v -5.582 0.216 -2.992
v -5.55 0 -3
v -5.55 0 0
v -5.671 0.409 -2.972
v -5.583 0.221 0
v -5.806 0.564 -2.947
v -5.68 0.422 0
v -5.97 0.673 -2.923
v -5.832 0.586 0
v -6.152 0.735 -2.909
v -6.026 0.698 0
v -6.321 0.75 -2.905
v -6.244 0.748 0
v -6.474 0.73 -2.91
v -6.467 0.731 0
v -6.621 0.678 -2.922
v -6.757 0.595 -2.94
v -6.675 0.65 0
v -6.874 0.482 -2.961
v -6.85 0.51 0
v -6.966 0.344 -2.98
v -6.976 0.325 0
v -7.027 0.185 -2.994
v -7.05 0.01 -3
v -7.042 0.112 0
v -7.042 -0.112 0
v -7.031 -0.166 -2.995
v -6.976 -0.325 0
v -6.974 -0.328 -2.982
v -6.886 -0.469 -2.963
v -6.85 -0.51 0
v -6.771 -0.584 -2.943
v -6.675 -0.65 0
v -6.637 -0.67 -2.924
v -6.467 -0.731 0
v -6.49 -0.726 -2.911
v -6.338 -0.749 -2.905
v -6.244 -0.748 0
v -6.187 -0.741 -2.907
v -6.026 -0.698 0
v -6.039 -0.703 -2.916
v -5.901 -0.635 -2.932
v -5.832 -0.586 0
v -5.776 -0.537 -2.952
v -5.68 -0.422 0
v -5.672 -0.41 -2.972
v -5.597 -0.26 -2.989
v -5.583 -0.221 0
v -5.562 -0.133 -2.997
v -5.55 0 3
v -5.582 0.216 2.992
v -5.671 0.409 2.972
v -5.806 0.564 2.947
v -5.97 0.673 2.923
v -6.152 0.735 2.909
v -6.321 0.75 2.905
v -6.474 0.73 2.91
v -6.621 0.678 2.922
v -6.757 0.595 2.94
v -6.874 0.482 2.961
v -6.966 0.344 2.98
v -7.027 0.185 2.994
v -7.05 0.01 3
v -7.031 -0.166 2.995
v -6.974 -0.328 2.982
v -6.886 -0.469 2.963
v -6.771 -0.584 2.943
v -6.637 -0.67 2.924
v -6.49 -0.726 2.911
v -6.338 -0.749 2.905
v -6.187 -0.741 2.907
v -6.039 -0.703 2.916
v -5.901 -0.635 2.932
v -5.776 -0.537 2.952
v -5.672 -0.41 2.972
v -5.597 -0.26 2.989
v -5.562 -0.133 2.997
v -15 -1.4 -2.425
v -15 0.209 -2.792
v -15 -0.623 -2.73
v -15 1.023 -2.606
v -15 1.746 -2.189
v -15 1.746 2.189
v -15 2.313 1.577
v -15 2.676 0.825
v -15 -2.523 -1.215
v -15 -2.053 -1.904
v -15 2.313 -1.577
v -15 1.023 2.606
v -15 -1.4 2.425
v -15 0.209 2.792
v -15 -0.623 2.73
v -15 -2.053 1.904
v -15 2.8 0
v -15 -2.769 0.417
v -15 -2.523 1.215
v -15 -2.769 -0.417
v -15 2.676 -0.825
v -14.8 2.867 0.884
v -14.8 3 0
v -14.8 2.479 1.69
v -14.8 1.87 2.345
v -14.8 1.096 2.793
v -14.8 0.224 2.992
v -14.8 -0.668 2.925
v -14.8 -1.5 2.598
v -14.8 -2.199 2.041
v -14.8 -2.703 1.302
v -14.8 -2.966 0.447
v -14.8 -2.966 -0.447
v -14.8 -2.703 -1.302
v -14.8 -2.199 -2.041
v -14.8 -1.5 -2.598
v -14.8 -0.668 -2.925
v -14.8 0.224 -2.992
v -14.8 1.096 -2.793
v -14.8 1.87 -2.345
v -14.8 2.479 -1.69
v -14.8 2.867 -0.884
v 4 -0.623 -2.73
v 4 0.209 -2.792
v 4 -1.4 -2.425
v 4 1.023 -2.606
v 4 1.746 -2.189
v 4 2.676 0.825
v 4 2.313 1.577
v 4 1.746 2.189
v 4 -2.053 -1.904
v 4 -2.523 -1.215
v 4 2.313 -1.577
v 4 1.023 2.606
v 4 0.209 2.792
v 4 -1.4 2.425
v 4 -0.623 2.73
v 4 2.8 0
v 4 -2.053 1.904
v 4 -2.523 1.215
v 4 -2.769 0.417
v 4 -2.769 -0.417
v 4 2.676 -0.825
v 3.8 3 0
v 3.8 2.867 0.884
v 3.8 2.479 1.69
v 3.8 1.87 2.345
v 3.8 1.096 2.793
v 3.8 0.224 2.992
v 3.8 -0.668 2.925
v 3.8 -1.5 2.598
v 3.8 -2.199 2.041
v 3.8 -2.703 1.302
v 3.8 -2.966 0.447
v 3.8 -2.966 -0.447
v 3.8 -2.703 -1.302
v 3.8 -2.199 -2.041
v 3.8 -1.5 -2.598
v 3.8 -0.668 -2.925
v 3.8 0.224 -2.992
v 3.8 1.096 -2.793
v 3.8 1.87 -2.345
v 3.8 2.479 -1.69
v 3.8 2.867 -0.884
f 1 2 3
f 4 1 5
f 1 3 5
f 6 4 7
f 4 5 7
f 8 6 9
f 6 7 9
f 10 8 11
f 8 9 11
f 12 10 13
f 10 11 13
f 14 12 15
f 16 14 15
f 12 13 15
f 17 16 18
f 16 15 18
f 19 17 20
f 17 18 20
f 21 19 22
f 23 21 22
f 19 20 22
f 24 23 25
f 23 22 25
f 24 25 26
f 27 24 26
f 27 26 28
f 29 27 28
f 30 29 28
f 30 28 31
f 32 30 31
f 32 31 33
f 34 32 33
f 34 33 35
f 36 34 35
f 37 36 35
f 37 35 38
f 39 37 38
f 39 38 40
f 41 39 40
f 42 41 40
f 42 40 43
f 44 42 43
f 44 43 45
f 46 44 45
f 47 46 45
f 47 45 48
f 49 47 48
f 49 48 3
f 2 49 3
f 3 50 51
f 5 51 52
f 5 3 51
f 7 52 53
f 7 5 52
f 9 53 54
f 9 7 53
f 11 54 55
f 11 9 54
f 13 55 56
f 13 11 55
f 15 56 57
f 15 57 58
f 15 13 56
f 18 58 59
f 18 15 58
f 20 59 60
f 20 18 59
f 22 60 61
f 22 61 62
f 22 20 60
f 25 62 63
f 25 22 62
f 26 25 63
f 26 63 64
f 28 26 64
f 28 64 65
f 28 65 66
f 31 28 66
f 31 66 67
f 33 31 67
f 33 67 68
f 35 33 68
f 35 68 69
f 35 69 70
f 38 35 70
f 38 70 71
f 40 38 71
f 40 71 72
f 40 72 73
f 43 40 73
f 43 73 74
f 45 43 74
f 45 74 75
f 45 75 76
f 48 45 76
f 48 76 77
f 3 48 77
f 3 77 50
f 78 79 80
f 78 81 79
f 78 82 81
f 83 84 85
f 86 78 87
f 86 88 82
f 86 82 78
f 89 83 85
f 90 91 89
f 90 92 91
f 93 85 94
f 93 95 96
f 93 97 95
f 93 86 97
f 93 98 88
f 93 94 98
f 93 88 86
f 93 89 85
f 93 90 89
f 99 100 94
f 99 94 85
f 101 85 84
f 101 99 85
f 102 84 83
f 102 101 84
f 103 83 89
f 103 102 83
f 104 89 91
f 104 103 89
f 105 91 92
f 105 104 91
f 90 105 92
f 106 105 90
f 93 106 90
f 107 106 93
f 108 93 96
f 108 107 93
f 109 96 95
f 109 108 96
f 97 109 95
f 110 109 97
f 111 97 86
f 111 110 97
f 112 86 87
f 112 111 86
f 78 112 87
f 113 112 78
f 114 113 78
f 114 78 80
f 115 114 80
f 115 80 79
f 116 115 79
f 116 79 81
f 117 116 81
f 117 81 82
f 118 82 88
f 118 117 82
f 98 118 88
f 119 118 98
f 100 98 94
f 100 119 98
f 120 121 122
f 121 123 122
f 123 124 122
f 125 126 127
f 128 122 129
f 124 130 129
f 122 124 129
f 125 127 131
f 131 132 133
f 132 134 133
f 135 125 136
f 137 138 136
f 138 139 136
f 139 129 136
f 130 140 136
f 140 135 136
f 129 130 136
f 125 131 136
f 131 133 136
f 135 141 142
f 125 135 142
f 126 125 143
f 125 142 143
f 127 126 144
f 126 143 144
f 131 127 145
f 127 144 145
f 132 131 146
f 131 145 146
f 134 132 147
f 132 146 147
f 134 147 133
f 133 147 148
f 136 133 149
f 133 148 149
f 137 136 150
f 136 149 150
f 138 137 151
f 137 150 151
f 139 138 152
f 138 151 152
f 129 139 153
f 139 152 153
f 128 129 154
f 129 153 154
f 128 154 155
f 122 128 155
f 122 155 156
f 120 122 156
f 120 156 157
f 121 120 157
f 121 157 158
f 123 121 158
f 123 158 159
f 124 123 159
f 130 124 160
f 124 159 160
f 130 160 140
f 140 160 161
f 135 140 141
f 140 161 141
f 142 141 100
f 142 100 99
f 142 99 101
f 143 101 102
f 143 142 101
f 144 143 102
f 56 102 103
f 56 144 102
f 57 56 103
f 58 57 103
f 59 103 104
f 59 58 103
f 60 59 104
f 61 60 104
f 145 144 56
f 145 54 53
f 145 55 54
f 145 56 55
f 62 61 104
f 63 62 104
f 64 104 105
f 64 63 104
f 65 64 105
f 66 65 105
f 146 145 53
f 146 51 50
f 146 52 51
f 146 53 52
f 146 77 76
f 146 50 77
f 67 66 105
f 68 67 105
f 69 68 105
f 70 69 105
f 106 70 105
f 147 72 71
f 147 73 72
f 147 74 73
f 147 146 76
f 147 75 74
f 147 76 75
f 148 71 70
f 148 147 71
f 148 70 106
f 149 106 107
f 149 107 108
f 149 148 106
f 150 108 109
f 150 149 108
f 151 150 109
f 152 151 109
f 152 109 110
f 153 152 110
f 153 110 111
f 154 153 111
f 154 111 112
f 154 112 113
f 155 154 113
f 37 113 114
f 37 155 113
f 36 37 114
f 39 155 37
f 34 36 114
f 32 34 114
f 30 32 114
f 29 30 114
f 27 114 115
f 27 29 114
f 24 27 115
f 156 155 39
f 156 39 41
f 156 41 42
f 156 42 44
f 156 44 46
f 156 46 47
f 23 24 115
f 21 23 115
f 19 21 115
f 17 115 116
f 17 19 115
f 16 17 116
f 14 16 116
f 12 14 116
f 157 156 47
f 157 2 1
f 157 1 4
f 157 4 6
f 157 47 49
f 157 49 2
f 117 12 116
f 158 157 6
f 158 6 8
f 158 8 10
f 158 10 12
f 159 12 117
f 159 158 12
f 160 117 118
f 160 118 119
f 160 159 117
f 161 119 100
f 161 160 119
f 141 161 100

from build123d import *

# Parameters (mm, degrees)
ESQUISSE1_W                  = 19
ESQUISSE1_H                  = 3
CHANFREIN1_SIZE              = 0.2
ESQUISSE2_R                  = 0.75
ENL_V_MAT_EXTRU_1_DEPTH      = 4
ENL_V_MAT_EXTRU_1_DEPTH_BACK = 4


with BuildPart() as part:
    # Esquisse1 → Révolution1 (revolve)
    with BuildSketch(Plane.XY):
        with Locations((-5.5, 1.5)):
            Rectangle(ESQUISSE1_W, ESQUISSE1_H)
    revolve(axis=Axis((-15, 0, 0), (1, 0, 0)))

    # Chanfrein1
    chanfrein1_edges = [part.edges().sort_by_distance(p)[0] for p in [
        (-15, -3, 0),
        (4, -3, 0),
    ]]
    chamfer(chanfrein1_edges, length=CHANFREIN1_SIZE)

    # Esquisse2 → Enlèv. mat.-Extru.1 (cut, two sides)
    with BuildSketch(Plane.XY) as enl_v_mat_extru_1_sk:
        with Locations((-6.3, 0)):
            Circle(ESQUISSE2_R)
    extrude(amount=ENL_V_MAT_EXTRU_1_DEPTH, mode=Mode.SUBTRACT)
    extrude(enl_v_mat_extru_1_sk.sketch, amount=-ENL_V_MAT_EXTRU_1_DEPTH_BACK, mode=Mode.SUBTRACT)


solid = part.part
